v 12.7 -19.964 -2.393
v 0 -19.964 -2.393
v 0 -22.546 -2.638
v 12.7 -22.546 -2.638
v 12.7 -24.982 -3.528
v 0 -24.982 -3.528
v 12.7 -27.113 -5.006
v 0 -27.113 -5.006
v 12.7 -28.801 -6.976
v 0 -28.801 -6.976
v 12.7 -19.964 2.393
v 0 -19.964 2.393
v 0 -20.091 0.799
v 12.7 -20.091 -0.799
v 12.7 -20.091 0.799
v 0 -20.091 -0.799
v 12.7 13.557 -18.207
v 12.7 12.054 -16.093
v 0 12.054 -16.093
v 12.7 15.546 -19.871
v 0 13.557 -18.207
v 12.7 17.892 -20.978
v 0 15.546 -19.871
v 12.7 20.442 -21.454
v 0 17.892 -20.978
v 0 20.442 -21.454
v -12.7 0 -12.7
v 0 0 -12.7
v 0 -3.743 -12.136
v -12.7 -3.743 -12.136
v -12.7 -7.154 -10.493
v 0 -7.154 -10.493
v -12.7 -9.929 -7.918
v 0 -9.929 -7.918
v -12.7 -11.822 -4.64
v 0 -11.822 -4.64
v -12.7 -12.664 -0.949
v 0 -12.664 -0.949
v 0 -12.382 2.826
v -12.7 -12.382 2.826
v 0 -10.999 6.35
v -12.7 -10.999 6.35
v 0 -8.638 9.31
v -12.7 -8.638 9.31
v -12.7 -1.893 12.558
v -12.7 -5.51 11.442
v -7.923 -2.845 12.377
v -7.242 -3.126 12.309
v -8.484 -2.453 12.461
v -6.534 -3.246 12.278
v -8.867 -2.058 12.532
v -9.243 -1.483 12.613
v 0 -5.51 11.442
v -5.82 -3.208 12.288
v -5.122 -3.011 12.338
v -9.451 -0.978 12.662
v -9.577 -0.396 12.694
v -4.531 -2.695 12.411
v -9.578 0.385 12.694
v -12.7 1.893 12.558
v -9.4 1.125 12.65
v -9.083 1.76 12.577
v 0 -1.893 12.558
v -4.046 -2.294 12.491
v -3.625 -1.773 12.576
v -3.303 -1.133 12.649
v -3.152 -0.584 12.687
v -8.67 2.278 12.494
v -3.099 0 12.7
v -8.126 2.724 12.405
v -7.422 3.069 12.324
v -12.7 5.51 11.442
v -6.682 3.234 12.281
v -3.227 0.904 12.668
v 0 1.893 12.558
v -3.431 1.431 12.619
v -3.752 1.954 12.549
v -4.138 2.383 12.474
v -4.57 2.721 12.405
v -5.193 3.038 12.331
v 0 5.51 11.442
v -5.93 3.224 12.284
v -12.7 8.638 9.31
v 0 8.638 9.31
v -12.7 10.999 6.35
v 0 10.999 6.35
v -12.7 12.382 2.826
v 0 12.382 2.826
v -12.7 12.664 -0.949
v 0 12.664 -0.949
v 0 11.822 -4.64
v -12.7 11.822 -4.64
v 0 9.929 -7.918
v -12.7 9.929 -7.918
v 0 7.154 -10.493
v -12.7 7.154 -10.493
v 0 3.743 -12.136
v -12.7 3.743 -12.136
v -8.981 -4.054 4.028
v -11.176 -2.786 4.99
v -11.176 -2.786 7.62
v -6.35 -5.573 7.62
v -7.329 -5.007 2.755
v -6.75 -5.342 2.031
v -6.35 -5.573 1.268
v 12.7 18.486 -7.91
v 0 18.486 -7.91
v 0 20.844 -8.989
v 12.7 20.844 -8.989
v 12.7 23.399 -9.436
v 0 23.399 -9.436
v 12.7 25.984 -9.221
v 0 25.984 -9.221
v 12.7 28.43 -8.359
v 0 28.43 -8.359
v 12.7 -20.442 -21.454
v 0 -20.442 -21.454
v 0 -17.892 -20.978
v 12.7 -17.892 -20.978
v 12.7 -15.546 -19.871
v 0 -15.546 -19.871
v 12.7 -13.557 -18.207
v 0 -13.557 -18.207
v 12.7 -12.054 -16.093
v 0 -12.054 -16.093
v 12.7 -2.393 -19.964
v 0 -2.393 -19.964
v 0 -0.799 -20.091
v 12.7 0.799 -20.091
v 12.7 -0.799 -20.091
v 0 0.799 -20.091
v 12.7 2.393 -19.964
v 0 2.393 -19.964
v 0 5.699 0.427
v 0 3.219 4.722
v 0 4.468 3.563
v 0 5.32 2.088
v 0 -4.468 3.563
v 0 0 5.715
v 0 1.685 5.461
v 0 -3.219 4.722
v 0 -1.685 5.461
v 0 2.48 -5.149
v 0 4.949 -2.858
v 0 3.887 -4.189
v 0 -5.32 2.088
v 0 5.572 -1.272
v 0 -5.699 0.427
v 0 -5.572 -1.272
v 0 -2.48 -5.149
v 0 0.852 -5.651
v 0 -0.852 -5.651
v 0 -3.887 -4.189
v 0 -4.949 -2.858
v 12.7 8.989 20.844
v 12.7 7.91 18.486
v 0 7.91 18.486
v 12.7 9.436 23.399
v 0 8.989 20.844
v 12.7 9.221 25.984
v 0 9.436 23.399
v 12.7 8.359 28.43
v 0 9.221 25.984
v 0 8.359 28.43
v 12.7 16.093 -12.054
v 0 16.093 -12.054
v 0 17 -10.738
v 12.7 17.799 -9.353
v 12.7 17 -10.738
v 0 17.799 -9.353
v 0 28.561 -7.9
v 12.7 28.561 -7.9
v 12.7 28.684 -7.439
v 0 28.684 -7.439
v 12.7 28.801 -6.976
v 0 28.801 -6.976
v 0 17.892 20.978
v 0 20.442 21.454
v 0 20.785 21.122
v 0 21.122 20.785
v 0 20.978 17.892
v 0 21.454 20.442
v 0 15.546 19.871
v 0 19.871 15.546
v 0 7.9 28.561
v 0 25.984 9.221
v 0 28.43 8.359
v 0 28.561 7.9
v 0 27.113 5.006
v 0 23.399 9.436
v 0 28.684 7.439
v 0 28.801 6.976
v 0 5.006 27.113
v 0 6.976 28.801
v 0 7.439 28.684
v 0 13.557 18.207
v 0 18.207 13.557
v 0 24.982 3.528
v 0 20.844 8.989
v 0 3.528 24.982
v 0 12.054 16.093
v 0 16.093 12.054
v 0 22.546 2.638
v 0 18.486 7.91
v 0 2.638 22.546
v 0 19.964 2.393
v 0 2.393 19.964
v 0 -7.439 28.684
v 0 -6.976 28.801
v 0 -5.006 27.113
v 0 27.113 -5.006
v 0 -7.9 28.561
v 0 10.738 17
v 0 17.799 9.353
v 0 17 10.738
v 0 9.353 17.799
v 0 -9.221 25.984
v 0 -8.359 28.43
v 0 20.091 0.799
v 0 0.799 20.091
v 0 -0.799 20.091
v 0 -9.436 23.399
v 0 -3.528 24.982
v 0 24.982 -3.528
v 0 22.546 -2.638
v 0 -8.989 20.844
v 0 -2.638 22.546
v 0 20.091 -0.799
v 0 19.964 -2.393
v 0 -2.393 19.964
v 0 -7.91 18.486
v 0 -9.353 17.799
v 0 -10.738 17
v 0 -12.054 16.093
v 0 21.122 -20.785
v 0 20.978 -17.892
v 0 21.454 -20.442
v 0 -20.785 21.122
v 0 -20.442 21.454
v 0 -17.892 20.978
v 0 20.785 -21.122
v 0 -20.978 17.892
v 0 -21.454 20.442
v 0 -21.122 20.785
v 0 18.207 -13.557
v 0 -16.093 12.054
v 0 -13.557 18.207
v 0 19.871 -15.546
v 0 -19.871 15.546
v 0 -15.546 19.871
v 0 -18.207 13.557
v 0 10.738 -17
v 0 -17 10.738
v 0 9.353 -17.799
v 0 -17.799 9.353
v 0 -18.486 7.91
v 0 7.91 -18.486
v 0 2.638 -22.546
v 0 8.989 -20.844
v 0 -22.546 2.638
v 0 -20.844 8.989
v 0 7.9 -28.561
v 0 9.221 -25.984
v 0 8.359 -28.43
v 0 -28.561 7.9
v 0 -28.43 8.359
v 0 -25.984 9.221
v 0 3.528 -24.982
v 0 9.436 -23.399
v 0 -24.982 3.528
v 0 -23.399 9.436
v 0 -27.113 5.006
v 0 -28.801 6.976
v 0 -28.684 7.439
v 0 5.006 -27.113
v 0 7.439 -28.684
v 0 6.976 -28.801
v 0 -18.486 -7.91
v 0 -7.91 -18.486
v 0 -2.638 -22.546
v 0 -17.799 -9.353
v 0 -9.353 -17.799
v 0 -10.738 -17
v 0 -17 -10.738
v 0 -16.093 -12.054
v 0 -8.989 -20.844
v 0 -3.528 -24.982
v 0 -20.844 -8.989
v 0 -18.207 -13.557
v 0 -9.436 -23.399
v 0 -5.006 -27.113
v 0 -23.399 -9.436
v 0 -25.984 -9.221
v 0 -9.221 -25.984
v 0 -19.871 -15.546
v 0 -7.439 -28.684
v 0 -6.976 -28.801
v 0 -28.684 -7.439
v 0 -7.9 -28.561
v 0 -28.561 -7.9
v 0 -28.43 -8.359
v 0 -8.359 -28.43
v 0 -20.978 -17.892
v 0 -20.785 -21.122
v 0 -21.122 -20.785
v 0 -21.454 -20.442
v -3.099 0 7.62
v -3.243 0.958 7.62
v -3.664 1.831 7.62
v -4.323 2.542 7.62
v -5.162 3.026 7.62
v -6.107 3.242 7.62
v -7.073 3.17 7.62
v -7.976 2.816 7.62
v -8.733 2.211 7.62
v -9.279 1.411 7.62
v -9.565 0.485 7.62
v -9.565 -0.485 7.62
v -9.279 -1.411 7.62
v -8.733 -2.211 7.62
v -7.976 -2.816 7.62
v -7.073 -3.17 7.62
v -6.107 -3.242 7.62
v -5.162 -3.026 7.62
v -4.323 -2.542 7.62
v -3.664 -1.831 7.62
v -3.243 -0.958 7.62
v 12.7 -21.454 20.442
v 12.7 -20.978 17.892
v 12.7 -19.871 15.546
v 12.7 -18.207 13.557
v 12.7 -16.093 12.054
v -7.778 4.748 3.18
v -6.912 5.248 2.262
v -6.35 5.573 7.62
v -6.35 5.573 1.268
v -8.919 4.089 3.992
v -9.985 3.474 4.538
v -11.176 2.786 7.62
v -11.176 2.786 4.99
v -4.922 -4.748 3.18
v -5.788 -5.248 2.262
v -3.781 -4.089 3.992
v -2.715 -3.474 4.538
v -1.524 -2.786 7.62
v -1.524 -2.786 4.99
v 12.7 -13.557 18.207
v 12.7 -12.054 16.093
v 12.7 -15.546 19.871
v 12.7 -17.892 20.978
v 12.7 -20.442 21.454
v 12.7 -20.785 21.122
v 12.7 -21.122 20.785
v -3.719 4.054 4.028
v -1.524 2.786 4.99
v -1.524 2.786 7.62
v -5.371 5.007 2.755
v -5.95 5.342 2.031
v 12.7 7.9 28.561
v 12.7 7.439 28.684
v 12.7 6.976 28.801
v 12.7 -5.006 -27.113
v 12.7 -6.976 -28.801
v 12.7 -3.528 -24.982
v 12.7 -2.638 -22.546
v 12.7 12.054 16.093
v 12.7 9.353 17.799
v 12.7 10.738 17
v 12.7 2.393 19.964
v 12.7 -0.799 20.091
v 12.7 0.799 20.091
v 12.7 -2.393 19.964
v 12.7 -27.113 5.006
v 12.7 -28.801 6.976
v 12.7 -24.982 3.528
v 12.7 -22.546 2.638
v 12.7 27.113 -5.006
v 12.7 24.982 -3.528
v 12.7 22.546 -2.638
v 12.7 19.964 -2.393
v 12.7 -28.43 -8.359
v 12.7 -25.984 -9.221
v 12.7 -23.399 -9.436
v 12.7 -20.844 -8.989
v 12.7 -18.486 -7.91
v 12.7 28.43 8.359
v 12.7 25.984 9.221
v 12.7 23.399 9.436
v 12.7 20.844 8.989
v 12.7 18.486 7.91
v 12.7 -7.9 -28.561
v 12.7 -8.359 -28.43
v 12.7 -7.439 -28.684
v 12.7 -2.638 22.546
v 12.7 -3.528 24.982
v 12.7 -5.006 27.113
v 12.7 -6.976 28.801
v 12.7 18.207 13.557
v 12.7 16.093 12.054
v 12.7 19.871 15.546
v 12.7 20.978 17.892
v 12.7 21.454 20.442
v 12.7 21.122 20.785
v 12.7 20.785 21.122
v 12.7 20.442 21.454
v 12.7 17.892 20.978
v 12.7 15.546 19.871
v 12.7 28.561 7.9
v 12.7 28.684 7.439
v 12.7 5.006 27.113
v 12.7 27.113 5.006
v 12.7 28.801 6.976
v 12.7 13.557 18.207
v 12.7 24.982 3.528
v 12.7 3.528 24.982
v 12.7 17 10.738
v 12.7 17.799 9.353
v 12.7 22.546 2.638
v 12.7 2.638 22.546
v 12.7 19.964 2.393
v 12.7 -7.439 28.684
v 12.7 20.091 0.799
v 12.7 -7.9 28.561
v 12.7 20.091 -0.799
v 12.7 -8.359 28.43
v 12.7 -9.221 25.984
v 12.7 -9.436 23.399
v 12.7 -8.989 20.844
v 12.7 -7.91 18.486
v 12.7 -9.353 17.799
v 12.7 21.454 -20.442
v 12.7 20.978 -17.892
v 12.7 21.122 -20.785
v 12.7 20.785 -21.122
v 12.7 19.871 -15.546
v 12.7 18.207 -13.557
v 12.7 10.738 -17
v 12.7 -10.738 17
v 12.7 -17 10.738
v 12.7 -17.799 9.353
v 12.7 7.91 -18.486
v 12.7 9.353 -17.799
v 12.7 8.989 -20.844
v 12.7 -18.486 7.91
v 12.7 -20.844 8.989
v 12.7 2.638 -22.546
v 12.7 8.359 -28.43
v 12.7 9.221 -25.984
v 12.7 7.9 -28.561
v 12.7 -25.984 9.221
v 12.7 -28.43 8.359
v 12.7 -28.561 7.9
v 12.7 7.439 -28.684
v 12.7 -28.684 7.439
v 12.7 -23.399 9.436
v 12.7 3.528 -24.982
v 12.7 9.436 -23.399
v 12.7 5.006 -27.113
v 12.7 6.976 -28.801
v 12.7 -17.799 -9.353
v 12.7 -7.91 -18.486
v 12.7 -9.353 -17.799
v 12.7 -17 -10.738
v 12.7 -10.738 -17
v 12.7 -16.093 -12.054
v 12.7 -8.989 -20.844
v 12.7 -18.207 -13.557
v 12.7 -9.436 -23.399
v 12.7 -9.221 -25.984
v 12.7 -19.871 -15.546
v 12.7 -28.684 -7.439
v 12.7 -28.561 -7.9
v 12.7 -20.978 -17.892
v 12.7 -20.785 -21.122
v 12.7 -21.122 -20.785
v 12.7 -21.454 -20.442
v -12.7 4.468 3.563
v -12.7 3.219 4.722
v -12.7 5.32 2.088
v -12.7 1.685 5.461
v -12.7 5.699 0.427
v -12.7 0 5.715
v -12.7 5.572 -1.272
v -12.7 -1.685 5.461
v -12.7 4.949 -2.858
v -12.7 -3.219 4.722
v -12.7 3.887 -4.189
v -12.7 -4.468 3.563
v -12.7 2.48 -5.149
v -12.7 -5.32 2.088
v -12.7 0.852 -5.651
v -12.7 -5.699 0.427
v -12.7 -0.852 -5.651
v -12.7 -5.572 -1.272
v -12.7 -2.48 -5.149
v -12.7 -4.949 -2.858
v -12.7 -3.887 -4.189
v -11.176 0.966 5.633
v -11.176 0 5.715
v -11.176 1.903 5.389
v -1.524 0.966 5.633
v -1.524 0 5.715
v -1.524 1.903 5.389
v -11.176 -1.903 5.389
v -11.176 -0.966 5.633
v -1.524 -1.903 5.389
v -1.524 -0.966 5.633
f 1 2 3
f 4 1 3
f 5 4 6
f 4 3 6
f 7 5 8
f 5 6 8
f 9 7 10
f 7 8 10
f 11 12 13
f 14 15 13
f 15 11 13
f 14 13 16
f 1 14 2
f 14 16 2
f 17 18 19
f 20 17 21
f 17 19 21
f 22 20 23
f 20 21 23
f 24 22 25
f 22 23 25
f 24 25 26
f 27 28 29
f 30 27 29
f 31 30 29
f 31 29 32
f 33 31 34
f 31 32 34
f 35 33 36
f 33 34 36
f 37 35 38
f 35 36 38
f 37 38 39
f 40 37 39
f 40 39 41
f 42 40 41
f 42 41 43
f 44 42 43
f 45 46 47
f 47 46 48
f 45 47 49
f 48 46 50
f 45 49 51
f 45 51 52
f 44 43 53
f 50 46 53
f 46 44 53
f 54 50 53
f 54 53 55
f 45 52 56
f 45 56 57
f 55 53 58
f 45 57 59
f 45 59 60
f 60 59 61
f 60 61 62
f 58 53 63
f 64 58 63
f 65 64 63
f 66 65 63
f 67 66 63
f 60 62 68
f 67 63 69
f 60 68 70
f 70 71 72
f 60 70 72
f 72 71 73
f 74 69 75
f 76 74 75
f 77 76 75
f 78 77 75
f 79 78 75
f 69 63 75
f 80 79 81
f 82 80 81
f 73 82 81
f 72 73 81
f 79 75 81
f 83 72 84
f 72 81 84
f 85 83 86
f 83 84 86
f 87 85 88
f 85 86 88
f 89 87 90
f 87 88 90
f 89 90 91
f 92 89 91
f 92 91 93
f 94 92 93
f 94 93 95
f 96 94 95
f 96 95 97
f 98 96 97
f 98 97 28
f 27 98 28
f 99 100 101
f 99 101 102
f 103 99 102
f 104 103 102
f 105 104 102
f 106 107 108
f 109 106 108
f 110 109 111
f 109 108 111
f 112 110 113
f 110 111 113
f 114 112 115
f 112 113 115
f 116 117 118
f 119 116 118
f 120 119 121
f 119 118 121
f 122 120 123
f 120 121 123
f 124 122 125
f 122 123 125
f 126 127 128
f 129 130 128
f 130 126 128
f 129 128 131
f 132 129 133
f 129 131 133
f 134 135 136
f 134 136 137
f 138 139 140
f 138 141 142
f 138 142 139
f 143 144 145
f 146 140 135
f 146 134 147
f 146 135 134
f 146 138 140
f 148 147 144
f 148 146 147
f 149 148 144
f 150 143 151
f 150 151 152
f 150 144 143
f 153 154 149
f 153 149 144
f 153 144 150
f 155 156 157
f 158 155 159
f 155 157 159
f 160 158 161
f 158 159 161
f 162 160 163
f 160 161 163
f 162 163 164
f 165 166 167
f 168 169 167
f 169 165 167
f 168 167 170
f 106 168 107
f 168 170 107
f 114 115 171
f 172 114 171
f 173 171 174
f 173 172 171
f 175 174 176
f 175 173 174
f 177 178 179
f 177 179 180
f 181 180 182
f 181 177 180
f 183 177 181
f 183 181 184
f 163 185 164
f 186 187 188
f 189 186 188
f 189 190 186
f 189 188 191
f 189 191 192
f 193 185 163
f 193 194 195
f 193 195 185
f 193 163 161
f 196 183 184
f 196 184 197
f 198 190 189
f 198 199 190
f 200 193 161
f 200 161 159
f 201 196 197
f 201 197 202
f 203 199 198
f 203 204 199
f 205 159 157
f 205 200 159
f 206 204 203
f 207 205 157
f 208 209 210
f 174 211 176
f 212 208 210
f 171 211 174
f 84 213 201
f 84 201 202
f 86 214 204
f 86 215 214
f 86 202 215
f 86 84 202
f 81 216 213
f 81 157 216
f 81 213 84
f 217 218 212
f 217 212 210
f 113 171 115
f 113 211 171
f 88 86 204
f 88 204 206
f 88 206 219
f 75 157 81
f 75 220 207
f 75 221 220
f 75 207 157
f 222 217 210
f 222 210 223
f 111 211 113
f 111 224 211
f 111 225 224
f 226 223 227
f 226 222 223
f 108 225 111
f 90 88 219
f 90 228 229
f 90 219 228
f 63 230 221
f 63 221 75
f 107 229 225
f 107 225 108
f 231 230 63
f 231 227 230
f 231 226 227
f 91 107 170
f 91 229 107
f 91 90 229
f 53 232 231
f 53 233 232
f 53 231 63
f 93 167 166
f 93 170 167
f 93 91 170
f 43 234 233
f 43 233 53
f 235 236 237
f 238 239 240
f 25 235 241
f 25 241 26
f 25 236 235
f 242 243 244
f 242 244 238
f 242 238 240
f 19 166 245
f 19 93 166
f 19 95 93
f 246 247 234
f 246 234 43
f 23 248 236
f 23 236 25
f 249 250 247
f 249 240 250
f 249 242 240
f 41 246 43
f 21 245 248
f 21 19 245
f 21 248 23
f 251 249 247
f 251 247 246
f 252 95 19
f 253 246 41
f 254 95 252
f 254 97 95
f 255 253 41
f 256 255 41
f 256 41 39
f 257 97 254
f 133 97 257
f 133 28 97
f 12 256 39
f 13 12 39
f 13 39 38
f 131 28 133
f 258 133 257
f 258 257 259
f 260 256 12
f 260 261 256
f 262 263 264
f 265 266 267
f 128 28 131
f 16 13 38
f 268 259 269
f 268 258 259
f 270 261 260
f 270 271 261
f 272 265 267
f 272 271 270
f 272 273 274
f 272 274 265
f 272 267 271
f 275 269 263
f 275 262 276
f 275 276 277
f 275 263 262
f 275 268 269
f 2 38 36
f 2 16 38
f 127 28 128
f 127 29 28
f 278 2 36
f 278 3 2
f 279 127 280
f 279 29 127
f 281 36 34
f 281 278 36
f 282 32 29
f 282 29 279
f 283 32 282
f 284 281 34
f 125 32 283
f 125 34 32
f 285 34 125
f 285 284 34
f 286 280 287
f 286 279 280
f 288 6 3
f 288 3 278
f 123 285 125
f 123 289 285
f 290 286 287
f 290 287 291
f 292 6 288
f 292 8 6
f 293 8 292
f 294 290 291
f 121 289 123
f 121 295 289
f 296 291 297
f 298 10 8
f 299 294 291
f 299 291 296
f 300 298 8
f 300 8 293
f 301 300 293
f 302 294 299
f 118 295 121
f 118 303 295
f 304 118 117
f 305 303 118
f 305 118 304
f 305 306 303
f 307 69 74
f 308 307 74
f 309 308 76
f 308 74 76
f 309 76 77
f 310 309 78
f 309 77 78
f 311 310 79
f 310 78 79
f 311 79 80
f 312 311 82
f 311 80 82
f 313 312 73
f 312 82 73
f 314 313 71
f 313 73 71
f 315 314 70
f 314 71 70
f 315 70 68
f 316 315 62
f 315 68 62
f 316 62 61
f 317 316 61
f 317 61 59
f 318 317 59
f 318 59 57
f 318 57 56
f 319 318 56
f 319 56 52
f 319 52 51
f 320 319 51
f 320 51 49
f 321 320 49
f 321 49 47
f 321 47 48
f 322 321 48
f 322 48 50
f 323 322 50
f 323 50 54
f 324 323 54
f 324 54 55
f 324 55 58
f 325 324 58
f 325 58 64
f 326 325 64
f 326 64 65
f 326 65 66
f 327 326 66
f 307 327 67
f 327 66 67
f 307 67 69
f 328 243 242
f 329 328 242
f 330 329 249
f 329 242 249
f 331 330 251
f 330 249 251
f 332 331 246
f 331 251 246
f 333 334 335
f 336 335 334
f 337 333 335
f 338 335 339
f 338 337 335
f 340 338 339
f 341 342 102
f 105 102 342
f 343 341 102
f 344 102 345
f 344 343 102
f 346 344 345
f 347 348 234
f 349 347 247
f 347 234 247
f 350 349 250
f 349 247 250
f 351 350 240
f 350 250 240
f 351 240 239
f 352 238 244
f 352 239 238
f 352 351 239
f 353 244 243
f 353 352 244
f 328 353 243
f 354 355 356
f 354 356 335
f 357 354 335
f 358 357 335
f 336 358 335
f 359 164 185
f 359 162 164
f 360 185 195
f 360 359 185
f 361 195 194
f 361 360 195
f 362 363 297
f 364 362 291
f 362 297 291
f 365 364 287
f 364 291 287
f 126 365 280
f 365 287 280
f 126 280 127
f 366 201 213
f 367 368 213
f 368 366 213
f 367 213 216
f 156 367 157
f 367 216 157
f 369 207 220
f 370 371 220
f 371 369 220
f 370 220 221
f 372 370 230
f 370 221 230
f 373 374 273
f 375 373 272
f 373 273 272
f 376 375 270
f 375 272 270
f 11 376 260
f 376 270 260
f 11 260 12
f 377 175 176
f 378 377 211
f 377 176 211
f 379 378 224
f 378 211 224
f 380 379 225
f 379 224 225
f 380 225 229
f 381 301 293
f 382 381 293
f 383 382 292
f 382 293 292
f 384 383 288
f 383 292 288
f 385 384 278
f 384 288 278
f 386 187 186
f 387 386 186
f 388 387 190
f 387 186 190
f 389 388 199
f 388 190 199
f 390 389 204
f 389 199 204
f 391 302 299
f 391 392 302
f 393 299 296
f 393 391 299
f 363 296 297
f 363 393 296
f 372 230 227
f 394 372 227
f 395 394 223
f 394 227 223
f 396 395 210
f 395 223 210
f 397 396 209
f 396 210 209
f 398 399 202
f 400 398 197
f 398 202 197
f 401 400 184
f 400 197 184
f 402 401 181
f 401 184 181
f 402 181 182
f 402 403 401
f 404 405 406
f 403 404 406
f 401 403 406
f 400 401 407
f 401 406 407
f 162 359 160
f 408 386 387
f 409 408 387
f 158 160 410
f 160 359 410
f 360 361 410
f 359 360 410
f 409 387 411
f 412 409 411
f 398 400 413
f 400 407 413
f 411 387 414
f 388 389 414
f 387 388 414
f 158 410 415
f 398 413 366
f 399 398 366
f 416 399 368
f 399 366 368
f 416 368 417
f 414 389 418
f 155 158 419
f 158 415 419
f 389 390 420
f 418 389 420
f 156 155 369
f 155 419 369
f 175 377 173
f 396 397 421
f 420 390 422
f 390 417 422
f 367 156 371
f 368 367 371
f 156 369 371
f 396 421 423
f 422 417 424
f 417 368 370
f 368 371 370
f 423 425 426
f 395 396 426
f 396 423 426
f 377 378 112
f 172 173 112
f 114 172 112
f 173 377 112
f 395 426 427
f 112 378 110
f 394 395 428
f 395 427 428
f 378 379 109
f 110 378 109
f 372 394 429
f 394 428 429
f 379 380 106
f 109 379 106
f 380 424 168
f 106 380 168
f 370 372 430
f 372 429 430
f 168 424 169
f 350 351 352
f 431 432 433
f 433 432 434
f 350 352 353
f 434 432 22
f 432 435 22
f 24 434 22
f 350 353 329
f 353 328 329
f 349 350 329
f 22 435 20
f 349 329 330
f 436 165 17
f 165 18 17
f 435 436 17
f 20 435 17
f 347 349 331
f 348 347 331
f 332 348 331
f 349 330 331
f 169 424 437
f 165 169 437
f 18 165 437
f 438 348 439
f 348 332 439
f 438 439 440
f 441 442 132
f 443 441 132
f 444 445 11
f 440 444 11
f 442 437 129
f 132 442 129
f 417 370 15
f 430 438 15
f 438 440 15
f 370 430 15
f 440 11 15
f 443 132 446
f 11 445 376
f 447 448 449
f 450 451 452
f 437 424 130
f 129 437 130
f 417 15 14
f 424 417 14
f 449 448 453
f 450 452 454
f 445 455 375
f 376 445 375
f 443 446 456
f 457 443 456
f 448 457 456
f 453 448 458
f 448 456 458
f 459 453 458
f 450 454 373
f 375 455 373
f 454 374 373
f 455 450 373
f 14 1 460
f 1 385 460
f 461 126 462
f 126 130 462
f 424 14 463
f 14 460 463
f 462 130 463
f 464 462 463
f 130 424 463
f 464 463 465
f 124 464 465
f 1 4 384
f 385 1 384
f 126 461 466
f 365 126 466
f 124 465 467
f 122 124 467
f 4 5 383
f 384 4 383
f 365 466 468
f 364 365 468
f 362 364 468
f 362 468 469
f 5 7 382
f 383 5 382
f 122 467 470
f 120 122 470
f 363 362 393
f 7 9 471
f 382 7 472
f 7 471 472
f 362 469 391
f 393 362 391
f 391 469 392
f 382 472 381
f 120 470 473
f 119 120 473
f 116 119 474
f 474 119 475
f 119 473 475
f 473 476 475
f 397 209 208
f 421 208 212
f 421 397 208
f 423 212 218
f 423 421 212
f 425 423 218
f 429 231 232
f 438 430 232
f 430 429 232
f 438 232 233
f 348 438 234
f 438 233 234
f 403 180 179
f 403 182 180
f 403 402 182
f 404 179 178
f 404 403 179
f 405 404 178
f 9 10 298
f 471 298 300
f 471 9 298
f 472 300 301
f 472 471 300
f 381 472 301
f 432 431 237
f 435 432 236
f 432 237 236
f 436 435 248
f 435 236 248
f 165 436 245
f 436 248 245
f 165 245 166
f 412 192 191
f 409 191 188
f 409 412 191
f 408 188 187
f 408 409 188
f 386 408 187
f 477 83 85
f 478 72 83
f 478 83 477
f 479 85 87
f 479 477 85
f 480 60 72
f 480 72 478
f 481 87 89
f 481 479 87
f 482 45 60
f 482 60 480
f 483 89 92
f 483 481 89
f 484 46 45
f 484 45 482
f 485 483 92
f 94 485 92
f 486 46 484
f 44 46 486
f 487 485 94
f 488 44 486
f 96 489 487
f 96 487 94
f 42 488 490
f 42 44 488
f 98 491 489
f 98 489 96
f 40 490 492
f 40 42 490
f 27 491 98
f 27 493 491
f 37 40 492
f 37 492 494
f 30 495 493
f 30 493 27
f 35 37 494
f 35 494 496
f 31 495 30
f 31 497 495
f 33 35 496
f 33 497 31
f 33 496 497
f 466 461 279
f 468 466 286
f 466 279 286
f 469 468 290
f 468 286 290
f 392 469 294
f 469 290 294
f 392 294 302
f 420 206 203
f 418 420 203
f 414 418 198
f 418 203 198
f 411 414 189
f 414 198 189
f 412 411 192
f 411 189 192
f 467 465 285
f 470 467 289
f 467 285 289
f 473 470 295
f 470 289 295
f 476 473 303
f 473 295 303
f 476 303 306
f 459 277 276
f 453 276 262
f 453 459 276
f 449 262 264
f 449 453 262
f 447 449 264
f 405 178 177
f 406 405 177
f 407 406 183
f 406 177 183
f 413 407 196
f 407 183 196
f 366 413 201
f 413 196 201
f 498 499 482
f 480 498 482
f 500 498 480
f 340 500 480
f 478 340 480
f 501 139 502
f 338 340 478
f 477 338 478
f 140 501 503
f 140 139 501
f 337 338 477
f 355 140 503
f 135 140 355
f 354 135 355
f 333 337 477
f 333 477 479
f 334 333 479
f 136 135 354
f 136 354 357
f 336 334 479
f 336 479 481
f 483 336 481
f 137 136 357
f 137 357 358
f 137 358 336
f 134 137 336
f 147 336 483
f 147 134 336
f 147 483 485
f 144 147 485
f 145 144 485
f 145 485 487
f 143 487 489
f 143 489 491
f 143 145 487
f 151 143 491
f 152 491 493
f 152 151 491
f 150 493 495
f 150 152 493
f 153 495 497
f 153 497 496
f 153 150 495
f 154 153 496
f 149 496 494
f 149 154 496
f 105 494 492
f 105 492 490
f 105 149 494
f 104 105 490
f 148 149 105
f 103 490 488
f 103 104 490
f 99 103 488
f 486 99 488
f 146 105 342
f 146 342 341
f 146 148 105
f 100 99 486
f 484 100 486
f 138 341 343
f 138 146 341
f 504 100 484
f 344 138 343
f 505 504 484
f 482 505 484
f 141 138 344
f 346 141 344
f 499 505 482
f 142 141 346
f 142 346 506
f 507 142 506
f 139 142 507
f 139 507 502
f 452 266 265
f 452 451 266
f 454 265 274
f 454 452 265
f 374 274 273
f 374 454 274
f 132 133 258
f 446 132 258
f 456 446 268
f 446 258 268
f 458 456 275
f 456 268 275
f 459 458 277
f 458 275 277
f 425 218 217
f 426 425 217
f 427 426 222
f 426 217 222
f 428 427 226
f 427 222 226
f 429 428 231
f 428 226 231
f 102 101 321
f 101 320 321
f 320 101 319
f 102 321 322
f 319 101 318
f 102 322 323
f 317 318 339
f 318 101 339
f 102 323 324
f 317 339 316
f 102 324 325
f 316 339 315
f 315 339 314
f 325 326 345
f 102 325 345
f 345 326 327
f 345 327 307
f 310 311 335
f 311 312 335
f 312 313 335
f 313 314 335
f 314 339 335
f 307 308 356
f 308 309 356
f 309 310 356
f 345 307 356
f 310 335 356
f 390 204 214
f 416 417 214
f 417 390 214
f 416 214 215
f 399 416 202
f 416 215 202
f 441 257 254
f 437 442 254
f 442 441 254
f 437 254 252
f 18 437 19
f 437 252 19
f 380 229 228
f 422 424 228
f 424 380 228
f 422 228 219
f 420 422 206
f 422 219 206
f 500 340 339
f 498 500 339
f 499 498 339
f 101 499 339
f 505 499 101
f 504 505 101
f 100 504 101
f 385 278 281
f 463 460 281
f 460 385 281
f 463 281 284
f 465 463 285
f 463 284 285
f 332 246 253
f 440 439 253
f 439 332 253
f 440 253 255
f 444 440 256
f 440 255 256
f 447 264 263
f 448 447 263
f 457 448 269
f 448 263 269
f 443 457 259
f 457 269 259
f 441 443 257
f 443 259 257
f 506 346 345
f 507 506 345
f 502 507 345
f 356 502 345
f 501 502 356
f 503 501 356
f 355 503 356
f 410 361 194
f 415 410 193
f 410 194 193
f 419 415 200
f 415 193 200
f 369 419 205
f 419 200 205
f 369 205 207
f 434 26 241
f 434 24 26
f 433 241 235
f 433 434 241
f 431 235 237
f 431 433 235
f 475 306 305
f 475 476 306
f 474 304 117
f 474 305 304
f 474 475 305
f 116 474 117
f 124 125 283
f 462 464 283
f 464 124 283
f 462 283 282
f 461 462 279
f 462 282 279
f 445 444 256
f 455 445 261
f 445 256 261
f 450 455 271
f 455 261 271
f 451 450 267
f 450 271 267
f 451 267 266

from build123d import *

# Parameters (mm, degrees)
BASPROSKE_W             = 12.7
BASPROSKE_H             = 29.633333333
TOOTHCUT_DEPTH          = 44.789940499
TEETHCUTS_COUNT         = 12
TEETHCUTS_ANGLE         = 330
SKETCH1_R               = 12.7
SKETCH1_R_2             = 5.715
BOSS_EXTRUDE1_DEPTH     = 12.7
CUT_EXTRUDE1_REACH      = 55.104
CUT_EXTRUDE1_END_RADIUS = 5.715
SKETCH2_R               = 3.2512
CUT_EXTRUDE2_DEPTH      = 7.62


with BuildPart() as part:
    # BasProSke → Base-Revolve (revolve)
    with BuildSketch(Plane(origin=(0, 0, 0), x_dir=(1, 0, 0), z_dir=(0, 1, 0)), mode=Mode.PRIVATE) as base_revolve_sk:
        with Locations((6.35, 14.816666667)):
            Rectangle(BASPROSKE_W, BASPROSKE_H)
    revolve(base_revolve_sk.sketch.rotate(Axis((-10, 0, 0), (1, 0, 0)), 180), axis=Axis((-10, 0, 0), (1, 0, 0)))

    # TooCutSke → ToothCut (cut, through all)
    with BuildSketch(Plane(origin=(0, 0, 0), x_dir=(0, 0, -1), z_dir=(1, 0, 0))):
        with BuildLine():
            ThreePointArc((2.3928109, 19.964179219), (0, 20.107063333), (-2.3928109, 19.964179219))
            ThreePointArc((-2.3928109, 19.964179219), (-3.536123556, 24.99754811), (-7.005125344, 28.819588509))
            ThreePointArc((-7.005125344, 28.819588509), (0, 29.658733333), (7.005125344, 28.819588509))
            ThreePointArc((7.005125344, 28.819588509), (3.536123556, 24.99754811), (2.3928109, 19.964179219))
        make_face()
    toothcut = extrude(amount=TOOTHCUT_DEPTH, mode=Mode.SUBTRACT)

    # TeethCuts: ToothCut ×12 about axis
    teethcuts_axis = Axis((-10, 0, 0), (1, 0, 0))
    for i in range(1, TEETHCUTS_COUNT):
        add(toothcut.rotate(teethcuts_axis, i * TEETHCUTS_ANGLE / (TEETHCUTS_COUNT - 1)), mode=Mode.SUBTRACT)

    # Sketch1 → Boss-Extrude1 (add)
    with BuildSketch(Plane.ZY):
        with Locations(Location((0, 0, 0), (0, 0, 180))):
            Circle(SKETCH1_R)
        Circle(SKETCH1_R_2, mode=Mode.SUBTRACT)
    extrude(amount=BOSS_EXTRUDE1_DEPTH)

    # Cut-Extrude1: up to this cylinder (the profile starts outside it)
    cut_extrude1_end = Plane(origin=(-6.35, 0, 0), z_dir=(1, 0, 0)) * Cylinder(CUT_EXTRUDE1_END_RADIUS, 122.638, mode=Mode.PRIVATE)
    # Sketch2 → Cut-Extrude1 (cut, up to the surface)
    with BuildSketch(Plane.XY.offset(13.97), mode=Mode.PRIVATE) as cut_extrude1_sk1:
        with Locations((-6.35, 0)):
            Circle(SKETCH2_R)
    cut_extrude1_tool1 = extrude(cut_extrude1_sk1.sketch, amount=-CUT_EXTRUDE1_REACH, mode=Mode.PRIVATE) - cut_extrude1_end
    add(cut_extrude1_tool1.solids().sort_by_distance((-6.35, 0, 13.97))[0], mode=Mode.SUBTRACT)

    # Sketch4 → Cut-Extrude2 (cut)
    with BuildSketch(Plane.XY):
        Polygon((-1.524, 2.786292399), (-6.35, 5.572584798), (-11.176, 2.786292399), (-11.176, -2.786292399), (-6.35, -5.572584798), (-1.524, -2.786292399), align=None)
    extrude(amount=CUT_EXTRUDE2_DEPTH, mode=Mode.SUBTRACT)


solid = part.part
